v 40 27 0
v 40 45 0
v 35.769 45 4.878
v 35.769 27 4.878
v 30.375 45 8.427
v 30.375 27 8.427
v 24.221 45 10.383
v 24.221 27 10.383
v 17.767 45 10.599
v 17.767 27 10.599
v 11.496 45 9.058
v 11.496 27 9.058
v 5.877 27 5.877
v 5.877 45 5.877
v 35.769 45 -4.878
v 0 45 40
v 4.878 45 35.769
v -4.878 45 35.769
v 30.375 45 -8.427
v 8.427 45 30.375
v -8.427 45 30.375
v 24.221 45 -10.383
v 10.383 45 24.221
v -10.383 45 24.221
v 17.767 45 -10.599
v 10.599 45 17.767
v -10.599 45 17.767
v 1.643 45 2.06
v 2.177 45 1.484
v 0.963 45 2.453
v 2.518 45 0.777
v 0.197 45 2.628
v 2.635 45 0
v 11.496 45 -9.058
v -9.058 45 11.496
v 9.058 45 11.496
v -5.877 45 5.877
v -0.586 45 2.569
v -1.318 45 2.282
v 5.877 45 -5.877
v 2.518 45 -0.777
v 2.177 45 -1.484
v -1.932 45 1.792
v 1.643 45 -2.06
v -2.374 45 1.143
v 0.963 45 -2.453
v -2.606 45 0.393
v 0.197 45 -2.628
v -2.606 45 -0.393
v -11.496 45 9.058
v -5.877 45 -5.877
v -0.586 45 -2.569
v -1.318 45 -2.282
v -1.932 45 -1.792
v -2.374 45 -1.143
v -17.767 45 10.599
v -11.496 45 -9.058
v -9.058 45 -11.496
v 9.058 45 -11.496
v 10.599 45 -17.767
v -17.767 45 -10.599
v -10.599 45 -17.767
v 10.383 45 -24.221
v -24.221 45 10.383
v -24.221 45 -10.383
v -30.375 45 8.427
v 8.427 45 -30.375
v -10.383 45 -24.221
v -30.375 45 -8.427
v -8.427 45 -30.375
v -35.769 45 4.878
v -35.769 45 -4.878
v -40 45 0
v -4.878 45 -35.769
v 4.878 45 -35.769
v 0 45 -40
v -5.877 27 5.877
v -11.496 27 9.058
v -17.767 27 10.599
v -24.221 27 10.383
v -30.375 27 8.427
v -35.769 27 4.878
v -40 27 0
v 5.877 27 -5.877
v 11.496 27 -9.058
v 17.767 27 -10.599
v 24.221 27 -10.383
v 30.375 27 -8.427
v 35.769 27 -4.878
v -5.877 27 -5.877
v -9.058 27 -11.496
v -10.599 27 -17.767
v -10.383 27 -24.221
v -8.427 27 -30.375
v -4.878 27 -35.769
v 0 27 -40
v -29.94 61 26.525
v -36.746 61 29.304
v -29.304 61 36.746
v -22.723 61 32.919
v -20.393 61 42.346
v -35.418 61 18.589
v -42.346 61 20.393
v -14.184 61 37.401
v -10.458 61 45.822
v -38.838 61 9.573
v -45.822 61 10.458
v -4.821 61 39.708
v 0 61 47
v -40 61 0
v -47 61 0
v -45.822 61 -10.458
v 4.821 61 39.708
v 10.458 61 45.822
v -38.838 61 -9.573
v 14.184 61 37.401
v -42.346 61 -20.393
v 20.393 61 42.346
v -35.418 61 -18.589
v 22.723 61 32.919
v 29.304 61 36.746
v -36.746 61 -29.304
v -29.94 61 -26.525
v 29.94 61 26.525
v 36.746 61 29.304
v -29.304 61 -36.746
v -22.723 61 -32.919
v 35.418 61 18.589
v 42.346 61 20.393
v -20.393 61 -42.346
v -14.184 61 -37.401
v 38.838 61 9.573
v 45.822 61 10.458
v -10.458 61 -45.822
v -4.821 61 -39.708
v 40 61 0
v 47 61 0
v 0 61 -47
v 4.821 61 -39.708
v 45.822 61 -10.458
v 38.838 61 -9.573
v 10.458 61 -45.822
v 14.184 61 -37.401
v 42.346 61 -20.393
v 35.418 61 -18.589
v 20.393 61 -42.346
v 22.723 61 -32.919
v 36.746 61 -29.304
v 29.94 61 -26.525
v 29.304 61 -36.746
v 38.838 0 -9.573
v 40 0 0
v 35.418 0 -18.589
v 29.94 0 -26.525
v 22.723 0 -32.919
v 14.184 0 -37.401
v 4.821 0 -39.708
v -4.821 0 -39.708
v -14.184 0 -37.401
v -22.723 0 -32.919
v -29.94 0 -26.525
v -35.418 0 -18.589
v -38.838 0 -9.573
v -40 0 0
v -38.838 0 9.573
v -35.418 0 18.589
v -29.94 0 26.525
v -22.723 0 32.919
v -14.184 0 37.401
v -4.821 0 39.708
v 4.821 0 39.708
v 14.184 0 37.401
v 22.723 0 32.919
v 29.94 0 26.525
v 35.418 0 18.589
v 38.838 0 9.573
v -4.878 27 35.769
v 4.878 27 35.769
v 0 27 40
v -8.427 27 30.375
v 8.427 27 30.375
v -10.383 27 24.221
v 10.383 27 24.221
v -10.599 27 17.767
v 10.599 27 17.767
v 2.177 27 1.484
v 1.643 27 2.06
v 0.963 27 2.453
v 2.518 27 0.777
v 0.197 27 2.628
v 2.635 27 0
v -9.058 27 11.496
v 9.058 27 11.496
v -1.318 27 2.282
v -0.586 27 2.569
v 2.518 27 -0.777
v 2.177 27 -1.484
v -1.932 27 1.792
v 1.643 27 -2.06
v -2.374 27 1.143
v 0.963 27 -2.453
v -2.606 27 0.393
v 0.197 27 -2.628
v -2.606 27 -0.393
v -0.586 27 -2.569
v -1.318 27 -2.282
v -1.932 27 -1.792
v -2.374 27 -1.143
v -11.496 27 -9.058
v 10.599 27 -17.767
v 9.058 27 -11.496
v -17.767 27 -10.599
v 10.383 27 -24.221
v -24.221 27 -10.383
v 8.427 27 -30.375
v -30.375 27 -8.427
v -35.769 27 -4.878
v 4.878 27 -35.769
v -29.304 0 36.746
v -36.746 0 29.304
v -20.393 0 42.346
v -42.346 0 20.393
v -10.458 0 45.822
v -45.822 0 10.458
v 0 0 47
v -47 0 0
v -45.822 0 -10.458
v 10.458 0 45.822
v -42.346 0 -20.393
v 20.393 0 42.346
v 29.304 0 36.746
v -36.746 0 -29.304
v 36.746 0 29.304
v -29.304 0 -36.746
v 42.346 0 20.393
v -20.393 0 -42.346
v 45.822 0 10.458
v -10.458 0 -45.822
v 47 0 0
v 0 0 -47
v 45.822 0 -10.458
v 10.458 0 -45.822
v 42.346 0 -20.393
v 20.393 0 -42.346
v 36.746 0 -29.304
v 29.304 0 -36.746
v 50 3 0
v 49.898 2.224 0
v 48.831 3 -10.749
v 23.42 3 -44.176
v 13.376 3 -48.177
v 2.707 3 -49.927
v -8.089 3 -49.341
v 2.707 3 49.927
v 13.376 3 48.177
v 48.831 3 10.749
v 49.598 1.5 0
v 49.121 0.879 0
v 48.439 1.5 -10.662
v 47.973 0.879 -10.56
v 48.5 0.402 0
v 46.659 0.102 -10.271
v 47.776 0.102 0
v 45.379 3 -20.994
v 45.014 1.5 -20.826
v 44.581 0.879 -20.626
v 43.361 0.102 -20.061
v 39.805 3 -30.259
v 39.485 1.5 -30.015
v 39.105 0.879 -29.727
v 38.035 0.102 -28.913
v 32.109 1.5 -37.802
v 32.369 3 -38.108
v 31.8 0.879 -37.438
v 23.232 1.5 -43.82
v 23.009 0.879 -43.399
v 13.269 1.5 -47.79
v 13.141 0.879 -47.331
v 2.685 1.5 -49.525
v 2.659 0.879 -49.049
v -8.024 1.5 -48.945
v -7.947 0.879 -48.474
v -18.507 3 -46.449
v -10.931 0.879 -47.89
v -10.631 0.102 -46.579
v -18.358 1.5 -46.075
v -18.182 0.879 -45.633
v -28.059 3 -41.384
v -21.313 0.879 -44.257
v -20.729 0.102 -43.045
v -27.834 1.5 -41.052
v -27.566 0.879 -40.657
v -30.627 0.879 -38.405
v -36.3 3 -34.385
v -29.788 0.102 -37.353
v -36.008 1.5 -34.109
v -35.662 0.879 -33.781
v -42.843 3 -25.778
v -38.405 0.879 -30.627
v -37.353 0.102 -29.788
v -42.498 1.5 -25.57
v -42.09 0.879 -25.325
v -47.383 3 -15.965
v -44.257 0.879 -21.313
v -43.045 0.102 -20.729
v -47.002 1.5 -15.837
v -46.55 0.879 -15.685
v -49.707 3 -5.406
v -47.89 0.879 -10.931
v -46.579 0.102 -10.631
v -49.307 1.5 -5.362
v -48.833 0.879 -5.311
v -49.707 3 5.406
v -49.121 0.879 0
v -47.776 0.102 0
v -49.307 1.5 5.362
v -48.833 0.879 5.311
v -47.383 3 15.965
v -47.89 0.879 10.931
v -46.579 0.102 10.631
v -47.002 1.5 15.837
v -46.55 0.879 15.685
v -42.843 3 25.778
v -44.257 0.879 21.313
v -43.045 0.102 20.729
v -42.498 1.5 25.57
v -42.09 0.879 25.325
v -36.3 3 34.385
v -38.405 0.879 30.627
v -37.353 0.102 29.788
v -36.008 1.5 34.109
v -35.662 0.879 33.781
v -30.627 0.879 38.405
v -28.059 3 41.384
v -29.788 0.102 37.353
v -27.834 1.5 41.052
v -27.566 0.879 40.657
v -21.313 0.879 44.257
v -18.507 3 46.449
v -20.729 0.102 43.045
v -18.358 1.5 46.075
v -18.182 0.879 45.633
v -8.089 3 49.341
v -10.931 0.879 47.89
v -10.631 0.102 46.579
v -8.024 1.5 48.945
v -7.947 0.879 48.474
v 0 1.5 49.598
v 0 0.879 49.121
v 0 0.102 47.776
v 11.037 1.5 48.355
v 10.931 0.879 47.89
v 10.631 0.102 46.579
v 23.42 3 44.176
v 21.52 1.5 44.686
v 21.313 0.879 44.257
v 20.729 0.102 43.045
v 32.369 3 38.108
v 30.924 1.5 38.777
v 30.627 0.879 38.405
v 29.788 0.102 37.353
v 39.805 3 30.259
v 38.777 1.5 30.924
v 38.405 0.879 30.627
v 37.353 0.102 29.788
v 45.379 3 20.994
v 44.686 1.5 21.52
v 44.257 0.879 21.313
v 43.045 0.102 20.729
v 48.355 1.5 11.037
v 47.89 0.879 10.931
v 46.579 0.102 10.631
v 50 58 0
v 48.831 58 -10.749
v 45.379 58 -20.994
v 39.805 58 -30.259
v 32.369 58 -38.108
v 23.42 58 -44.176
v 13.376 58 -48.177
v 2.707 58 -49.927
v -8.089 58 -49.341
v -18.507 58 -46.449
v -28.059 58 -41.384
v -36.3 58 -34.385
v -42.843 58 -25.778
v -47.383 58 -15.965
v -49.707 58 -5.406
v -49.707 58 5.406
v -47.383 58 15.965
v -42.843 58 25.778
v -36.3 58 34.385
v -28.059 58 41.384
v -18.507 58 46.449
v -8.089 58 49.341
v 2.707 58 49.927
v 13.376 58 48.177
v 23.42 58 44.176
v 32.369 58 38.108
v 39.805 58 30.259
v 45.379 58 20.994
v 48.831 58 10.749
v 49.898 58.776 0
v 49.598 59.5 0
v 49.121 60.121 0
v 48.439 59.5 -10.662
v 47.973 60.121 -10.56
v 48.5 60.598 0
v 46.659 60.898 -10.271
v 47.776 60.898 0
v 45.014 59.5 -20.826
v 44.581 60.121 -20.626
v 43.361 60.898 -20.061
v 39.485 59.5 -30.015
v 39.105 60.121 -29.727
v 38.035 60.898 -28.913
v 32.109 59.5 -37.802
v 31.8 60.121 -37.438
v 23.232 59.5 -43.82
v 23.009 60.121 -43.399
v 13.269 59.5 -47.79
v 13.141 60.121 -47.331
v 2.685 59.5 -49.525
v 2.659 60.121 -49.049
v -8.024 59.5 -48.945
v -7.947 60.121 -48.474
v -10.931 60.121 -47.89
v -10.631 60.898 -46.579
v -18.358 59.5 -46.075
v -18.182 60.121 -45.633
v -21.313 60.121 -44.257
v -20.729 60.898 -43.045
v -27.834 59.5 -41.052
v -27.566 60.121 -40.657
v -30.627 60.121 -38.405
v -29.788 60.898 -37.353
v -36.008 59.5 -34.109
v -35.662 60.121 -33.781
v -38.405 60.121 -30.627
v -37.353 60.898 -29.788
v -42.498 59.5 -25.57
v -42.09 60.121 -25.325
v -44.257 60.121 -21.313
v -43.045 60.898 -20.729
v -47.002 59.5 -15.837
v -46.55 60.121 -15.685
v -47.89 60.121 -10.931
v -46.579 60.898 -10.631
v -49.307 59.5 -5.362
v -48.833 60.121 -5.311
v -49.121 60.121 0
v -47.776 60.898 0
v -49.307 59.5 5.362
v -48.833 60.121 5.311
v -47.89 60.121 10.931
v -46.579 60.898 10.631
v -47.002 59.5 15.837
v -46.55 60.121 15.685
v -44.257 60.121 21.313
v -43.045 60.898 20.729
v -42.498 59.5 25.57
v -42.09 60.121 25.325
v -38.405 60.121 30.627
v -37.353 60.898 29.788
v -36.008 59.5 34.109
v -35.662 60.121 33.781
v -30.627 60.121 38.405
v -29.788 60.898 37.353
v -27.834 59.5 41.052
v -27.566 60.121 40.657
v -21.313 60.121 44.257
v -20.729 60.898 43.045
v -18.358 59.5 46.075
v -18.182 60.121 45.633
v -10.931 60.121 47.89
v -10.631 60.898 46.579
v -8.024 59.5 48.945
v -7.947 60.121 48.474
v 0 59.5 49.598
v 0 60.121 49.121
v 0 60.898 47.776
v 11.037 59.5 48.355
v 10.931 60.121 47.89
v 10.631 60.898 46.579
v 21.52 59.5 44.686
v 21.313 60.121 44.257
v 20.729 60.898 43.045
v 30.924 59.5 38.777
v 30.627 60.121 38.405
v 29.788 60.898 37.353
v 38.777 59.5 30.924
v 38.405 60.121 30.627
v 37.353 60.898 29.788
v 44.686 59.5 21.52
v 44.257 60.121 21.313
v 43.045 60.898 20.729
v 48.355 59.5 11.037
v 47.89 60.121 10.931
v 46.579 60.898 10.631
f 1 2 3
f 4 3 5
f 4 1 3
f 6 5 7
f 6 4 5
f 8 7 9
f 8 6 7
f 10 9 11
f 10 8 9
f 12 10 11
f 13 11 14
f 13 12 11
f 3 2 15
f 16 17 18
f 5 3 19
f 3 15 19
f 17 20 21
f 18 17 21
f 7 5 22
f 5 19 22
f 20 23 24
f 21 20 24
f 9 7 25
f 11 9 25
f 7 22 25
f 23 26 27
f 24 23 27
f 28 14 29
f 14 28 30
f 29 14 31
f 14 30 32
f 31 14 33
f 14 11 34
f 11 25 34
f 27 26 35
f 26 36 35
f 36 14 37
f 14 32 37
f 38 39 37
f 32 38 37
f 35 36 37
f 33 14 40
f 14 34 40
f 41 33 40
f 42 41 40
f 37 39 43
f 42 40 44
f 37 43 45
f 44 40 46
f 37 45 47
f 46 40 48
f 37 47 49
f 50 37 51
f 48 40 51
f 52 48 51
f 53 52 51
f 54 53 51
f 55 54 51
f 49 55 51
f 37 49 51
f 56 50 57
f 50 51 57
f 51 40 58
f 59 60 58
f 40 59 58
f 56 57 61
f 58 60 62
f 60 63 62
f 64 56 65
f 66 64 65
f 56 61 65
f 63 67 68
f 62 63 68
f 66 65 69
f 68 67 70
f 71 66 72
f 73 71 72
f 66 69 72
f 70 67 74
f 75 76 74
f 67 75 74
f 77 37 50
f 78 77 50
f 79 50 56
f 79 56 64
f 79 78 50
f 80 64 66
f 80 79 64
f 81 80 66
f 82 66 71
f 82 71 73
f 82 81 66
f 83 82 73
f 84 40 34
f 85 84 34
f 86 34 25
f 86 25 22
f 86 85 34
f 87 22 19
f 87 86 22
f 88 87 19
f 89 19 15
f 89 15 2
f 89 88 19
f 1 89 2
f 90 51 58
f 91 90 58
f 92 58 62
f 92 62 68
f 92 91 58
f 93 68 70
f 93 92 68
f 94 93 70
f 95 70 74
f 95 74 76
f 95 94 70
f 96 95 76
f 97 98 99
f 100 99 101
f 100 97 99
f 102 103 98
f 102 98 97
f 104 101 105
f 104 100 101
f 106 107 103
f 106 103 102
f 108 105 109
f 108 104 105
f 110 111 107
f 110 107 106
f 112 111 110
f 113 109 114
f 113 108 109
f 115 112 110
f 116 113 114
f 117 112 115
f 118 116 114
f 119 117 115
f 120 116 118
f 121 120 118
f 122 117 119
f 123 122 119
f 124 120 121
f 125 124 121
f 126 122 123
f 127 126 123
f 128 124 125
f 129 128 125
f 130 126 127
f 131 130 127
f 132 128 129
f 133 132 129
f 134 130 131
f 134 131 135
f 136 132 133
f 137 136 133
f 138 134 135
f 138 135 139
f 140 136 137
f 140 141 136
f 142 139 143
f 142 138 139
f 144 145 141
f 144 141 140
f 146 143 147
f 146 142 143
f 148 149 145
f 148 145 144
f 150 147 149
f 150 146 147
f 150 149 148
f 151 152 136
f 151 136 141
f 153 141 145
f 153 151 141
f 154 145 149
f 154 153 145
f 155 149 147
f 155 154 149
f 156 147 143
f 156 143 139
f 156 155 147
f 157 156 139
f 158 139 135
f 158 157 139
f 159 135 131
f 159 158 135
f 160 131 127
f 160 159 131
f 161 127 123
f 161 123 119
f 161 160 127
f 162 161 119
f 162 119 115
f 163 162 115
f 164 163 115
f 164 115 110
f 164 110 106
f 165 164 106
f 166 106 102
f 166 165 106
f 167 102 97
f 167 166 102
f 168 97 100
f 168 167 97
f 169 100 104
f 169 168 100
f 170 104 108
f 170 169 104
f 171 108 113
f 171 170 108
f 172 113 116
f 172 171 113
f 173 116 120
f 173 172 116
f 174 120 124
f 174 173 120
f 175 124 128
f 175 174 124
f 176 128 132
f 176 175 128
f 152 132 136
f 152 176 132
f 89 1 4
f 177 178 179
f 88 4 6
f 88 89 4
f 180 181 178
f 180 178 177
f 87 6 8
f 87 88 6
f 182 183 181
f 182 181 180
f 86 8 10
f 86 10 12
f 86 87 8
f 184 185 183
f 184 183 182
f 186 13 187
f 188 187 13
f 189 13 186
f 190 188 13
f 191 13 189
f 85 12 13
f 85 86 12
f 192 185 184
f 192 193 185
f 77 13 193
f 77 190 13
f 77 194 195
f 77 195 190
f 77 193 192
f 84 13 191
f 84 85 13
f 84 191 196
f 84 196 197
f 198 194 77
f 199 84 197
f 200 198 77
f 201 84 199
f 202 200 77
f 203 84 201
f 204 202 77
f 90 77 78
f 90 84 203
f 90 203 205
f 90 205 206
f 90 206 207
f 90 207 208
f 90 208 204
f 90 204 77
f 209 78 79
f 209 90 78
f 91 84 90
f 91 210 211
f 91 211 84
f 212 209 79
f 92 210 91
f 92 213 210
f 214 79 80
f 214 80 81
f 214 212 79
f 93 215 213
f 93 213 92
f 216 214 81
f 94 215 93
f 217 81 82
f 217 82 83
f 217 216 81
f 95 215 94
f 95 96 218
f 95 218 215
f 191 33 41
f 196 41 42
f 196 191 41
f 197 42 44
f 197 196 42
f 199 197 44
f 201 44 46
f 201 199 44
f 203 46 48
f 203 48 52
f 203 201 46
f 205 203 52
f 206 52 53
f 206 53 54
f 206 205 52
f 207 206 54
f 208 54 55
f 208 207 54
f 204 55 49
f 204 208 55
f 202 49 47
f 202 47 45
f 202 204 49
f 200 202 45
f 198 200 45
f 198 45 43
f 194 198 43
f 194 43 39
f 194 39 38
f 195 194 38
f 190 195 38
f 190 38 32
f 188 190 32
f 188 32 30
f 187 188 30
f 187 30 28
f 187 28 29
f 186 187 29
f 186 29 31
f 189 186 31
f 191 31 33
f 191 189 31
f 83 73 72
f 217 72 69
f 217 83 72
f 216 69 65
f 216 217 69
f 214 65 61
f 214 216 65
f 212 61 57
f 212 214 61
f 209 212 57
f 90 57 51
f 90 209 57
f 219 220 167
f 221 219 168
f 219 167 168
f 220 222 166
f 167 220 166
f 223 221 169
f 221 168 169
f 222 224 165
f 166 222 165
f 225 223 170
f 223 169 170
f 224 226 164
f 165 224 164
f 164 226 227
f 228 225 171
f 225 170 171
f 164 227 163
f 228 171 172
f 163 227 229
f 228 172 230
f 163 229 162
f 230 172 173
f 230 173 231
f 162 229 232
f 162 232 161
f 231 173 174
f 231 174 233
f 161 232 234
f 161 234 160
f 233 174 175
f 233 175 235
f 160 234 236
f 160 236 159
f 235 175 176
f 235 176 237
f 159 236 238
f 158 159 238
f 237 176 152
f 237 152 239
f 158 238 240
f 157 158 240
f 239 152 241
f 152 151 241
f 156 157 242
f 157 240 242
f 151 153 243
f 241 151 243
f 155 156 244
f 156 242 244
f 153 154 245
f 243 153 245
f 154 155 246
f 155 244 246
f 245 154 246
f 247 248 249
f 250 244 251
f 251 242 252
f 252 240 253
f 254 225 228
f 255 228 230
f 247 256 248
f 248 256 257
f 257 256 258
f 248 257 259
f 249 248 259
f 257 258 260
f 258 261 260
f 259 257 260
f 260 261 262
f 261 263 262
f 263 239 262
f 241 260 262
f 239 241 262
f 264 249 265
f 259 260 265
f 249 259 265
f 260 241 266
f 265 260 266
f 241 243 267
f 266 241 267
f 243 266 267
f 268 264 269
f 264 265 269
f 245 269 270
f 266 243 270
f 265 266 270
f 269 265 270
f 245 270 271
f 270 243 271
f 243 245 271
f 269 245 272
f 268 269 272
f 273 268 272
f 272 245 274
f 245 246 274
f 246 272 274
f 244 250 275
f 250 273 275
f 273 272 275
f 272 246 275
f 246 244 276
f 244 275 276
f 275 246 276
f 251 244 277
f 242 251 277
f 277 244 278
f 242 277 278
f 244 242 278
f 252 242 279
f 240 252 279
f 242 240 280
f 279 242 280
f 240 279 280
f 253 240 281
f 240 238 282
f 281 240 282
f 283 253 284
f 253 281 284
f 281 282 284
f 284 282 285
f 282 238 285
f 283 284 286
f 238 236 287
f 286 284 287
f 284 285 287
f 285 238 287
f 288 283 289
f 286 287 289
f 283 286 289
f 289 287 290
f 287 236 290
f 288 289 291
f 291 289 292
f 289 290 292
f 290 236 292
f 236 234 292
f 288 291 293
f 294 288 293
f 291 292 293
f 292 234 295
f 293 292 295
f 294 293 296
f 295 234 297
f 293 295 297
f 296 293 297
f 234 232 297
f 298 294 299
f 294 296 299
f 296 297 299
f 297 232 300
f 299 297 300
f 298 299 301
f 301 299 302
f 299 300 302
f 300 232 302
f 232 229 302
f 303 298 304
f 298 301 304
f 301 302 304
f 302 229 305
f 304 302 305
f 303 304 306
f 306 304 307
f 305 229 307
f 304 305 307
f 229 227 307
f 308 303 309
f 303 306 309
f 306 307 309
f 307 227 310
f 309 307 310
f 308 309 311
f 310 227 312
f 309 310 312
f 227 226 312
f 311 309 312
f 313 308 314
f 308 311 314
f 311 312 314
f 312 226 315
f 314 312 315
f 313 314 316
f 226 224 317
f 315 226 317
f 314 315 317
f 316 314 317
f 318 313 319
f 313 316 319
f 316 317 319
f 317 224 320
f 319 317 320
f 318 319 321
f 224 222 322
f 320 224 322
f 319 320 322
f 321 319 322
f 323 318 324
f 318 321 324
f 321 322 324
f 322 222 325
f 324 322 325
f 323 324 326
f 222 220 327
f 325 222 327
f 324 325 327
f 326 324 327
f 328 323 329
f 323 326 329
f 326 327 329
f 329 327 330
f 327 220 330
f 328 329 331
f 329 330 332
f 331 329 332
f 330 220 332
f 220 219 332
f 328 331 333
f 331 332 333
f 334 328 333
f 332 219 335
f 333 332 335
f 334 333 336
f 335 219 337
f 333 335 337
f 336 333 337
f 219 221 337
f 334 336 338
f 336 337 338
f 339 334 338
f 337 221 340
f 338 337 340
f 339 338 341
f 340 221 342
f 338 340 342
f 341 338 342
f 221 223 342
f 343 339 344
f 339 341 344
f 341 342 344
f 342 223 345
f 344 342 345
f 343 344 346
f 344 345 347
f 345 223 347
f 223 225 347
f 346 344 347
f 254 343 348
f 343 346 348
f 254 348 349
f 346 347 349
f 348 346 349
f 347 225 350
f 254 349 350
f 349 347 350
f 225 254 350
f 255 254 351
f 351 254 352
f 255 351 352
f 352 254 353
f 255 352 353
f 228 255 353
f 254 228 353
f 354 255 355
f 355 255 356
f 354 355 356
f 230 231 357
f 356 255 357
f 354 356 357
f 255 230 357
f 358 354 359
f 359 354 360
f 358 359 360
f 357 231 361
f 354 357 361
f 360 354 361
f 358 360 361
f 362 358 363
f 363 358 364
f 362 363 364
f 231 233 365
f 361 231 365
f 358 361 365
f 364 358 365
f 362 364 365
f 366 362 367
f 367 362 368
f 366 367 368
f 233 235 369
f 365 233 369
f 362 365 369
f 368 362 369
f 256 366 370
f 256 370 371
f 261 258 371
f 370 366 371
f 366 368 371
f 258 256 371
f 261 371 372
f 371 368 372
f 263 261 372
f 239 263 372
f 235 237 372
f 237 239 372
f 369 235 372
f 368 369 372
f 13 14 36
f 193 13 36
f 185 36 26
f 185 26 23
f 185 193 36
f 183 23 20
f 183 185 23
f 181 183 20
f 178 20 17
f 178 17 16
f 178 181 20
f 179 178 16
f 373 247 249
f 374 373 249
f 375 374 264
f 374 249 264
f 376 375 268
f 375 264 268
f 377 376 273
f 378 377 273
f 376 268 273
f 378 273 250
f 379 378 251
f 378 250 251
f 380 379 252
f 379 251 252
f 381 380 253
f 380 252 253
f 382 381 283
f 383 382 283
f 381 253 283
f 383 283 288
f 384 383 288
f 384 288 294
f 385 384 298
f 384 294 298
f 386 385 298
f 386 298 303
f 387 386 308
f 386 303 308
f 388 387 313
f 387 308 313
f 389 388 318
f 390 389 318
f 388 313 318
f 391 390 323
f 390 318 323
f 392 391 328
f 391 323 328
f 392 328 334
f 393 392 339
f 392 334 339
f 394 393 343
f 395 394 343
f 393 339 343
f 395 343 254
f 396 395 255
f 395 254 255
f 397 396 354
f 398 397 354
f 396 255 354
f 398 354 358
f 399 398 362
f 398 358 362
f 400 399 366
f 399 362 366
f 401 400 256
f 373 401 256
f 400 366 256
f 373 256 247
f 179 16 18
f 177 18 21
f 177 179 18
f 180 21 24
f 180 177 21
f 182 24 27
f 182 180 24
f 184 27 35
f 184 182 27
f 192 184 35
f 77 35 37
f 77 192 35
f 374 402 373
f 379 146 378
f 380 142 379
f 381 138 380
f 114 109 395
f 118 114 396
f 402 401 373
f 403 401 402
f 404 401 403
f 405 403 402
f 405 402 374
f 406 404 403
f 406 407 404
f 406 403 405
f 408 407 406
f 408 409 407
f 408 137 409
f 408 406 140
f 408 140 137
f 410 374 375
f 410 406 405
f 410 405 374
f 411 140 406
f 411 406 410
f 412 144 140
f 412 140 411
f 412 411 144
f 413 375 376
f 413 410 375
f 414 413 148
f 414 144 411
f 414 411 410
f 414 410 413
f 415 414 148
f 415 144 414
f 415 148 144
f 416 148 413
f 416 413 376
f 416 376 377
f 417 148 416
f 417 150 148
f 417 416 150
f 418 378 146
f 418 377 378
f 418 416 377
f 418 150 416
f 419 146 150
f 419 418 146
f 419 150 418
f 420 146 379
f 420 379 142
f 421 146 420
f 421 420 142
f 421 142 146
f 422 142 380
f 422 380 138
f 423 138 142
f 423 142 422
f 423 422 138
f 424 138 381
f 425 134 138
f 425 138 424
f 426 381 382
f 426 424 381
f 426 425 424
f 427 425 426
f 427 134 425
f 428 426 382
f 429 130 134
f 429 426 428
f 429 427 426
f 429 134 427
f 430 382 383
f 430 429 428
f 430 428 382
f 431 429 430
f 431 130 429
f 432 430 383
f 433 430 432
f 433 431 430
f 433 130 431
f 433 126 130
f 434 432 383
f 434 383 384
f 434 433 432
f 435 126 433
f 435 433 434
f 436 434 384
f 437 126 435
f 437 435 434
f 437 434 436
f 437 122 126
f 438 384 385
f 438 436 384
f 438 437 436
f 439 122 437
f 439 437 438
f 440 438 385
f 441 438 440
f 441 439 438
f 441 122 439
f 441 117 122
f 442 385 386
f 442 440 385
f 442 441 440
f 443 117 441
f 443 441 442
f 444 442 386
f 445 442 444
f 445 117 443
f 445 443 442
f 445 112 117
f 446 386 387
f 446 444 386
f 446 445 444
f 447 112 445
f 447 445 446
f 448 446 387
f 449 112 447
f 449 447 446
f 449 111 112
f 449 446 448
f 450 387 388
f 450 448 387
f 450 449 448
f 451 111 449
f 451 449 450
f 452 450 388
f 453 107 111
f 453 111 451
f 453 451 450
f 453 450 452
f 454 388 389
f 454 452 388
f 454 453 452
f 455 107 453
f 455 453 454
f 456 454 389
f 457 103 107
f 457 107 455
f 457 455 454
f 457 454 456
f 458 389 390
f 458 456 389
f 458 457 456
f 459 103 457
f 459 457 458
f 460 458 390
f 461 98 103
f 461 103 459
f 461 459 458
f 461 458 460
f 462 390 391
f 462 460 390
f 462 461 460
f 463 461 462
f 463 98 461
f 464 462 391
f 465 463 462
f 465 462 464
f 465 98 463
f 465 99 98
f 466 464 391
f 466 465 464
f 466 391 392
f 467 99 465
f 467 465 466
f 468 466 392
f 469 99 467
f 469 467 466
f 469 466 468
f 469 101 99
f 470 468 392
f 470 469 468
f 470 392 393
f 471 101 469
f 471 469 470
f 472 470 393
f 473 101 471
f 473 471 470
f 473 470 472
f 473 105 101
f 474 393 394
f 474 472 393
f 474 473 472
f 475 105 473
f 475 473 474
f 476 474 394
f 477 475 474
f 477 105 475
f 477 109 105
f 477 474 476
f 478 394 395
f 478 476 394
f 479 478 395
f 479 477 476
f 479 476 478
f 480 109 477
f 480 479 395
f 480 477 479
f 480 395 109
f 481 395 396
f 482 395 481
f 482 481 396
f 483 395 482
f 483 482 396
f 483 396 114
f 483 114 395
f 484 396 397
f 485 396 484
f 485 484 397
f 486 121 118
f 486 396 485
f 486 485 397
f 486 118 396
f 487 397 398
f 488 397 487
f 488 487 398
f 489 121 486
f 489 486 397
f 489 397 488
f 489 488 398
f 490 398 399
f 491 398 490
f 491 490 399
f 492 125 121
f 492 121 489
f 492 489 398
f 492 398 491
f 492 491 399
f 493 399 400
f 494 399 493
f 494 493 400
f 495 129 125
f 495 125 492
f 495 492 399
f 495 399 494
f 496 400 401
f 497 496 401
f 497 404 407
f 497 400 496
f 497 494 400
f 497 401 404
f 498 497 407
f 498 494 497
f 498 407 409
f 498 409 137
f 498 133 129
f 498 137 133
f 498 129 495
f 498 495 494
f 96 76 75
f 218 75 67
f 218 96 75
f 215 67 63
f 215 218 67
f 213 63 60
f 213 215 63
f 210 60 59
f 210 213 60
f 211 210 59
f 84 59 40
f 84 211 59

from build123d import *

# Parameters (mm, degrees)
SKETCH1_R           = 50
SKETCH1_R_2         = 40
BOSS_EXTRUDE1_DEPTH = 61
BOSS_EXTRUDE2_START = 27
SKETCH1_3_R         = 2.635
BOSS_EXTRUDE2_DEPTH = 18
FILLET1_R           = 3


with BuildPart() as part:
    # Sketch1 → Boss-Extrude1 (new body)
    with BuildSketch(Plane(origin=(0, 0, 0), x_dir=(1, 0, 0), z_dir=(0, 1, 0))):
        Circle(SKETCH1_R)
        Circle(SKETCH1_R_2, mode=Mode.SUBTRACT)
    extrude(amount=BOSS_EXTRUDE1_DEPTH)

    # Fillet1
    fillet1_edges = [part.edges().sort_by_distance(p)[0] for p in [
        (-50, 61, 0),
        (-50, 0, 0),
    ]]
    fillet(fillet1_edges, radius=FILLET1_R)


with BuildPart() as body_2:
    # Sketch1<3> → Boss-Extrude2 (new body)
    with BuildSketch(Plane(origin=(0, 0, 0), x_dir=(1, 0, 0), z_dir=(0, 1, 0)).offset(BOSS_EXTRUDE2_START)):
        with BuildLine():
            ThreePointArc((5.877030144, 5.877030144), (24.220657484, 10.382837425), (40, 0))
            ThreePointArc((40, 0), (24.220657484, -10.382837425), (5.877030144, -5.877030144))
            ThreePointArc((5.877030144, -5.877030144), (10.382837425, -24.220657484), (0, -40))
            ThreePointArc((0, -40), (-10.382837425, -24.220657484), (-5.877030144, -5.877030144))
            ThreePointArc((-5.877030144, -5.877030144), (-24.220657484, -10.382837425), (-40, 0))
            ThreePointArc((-40, 0), (-24.220657484, 10.382837425), (-5.877030144, 5.877030144))
            ThreePointArc((-5.877030144, 5.877030144), (-10.382837425, 24.220657484), (0, 40))
            ThreePointArc((0, 40), (10.382837425, 24.220657484), (5.877030144, 5.877030144))
        make_face()
        Circle(SKETCH1_3_R, mode=Mode.SUBTRACT)
    extrude(amount=BOSS_EXTRUDE2_DEPTH)


solid = Compound([part.part, body_2.part])
